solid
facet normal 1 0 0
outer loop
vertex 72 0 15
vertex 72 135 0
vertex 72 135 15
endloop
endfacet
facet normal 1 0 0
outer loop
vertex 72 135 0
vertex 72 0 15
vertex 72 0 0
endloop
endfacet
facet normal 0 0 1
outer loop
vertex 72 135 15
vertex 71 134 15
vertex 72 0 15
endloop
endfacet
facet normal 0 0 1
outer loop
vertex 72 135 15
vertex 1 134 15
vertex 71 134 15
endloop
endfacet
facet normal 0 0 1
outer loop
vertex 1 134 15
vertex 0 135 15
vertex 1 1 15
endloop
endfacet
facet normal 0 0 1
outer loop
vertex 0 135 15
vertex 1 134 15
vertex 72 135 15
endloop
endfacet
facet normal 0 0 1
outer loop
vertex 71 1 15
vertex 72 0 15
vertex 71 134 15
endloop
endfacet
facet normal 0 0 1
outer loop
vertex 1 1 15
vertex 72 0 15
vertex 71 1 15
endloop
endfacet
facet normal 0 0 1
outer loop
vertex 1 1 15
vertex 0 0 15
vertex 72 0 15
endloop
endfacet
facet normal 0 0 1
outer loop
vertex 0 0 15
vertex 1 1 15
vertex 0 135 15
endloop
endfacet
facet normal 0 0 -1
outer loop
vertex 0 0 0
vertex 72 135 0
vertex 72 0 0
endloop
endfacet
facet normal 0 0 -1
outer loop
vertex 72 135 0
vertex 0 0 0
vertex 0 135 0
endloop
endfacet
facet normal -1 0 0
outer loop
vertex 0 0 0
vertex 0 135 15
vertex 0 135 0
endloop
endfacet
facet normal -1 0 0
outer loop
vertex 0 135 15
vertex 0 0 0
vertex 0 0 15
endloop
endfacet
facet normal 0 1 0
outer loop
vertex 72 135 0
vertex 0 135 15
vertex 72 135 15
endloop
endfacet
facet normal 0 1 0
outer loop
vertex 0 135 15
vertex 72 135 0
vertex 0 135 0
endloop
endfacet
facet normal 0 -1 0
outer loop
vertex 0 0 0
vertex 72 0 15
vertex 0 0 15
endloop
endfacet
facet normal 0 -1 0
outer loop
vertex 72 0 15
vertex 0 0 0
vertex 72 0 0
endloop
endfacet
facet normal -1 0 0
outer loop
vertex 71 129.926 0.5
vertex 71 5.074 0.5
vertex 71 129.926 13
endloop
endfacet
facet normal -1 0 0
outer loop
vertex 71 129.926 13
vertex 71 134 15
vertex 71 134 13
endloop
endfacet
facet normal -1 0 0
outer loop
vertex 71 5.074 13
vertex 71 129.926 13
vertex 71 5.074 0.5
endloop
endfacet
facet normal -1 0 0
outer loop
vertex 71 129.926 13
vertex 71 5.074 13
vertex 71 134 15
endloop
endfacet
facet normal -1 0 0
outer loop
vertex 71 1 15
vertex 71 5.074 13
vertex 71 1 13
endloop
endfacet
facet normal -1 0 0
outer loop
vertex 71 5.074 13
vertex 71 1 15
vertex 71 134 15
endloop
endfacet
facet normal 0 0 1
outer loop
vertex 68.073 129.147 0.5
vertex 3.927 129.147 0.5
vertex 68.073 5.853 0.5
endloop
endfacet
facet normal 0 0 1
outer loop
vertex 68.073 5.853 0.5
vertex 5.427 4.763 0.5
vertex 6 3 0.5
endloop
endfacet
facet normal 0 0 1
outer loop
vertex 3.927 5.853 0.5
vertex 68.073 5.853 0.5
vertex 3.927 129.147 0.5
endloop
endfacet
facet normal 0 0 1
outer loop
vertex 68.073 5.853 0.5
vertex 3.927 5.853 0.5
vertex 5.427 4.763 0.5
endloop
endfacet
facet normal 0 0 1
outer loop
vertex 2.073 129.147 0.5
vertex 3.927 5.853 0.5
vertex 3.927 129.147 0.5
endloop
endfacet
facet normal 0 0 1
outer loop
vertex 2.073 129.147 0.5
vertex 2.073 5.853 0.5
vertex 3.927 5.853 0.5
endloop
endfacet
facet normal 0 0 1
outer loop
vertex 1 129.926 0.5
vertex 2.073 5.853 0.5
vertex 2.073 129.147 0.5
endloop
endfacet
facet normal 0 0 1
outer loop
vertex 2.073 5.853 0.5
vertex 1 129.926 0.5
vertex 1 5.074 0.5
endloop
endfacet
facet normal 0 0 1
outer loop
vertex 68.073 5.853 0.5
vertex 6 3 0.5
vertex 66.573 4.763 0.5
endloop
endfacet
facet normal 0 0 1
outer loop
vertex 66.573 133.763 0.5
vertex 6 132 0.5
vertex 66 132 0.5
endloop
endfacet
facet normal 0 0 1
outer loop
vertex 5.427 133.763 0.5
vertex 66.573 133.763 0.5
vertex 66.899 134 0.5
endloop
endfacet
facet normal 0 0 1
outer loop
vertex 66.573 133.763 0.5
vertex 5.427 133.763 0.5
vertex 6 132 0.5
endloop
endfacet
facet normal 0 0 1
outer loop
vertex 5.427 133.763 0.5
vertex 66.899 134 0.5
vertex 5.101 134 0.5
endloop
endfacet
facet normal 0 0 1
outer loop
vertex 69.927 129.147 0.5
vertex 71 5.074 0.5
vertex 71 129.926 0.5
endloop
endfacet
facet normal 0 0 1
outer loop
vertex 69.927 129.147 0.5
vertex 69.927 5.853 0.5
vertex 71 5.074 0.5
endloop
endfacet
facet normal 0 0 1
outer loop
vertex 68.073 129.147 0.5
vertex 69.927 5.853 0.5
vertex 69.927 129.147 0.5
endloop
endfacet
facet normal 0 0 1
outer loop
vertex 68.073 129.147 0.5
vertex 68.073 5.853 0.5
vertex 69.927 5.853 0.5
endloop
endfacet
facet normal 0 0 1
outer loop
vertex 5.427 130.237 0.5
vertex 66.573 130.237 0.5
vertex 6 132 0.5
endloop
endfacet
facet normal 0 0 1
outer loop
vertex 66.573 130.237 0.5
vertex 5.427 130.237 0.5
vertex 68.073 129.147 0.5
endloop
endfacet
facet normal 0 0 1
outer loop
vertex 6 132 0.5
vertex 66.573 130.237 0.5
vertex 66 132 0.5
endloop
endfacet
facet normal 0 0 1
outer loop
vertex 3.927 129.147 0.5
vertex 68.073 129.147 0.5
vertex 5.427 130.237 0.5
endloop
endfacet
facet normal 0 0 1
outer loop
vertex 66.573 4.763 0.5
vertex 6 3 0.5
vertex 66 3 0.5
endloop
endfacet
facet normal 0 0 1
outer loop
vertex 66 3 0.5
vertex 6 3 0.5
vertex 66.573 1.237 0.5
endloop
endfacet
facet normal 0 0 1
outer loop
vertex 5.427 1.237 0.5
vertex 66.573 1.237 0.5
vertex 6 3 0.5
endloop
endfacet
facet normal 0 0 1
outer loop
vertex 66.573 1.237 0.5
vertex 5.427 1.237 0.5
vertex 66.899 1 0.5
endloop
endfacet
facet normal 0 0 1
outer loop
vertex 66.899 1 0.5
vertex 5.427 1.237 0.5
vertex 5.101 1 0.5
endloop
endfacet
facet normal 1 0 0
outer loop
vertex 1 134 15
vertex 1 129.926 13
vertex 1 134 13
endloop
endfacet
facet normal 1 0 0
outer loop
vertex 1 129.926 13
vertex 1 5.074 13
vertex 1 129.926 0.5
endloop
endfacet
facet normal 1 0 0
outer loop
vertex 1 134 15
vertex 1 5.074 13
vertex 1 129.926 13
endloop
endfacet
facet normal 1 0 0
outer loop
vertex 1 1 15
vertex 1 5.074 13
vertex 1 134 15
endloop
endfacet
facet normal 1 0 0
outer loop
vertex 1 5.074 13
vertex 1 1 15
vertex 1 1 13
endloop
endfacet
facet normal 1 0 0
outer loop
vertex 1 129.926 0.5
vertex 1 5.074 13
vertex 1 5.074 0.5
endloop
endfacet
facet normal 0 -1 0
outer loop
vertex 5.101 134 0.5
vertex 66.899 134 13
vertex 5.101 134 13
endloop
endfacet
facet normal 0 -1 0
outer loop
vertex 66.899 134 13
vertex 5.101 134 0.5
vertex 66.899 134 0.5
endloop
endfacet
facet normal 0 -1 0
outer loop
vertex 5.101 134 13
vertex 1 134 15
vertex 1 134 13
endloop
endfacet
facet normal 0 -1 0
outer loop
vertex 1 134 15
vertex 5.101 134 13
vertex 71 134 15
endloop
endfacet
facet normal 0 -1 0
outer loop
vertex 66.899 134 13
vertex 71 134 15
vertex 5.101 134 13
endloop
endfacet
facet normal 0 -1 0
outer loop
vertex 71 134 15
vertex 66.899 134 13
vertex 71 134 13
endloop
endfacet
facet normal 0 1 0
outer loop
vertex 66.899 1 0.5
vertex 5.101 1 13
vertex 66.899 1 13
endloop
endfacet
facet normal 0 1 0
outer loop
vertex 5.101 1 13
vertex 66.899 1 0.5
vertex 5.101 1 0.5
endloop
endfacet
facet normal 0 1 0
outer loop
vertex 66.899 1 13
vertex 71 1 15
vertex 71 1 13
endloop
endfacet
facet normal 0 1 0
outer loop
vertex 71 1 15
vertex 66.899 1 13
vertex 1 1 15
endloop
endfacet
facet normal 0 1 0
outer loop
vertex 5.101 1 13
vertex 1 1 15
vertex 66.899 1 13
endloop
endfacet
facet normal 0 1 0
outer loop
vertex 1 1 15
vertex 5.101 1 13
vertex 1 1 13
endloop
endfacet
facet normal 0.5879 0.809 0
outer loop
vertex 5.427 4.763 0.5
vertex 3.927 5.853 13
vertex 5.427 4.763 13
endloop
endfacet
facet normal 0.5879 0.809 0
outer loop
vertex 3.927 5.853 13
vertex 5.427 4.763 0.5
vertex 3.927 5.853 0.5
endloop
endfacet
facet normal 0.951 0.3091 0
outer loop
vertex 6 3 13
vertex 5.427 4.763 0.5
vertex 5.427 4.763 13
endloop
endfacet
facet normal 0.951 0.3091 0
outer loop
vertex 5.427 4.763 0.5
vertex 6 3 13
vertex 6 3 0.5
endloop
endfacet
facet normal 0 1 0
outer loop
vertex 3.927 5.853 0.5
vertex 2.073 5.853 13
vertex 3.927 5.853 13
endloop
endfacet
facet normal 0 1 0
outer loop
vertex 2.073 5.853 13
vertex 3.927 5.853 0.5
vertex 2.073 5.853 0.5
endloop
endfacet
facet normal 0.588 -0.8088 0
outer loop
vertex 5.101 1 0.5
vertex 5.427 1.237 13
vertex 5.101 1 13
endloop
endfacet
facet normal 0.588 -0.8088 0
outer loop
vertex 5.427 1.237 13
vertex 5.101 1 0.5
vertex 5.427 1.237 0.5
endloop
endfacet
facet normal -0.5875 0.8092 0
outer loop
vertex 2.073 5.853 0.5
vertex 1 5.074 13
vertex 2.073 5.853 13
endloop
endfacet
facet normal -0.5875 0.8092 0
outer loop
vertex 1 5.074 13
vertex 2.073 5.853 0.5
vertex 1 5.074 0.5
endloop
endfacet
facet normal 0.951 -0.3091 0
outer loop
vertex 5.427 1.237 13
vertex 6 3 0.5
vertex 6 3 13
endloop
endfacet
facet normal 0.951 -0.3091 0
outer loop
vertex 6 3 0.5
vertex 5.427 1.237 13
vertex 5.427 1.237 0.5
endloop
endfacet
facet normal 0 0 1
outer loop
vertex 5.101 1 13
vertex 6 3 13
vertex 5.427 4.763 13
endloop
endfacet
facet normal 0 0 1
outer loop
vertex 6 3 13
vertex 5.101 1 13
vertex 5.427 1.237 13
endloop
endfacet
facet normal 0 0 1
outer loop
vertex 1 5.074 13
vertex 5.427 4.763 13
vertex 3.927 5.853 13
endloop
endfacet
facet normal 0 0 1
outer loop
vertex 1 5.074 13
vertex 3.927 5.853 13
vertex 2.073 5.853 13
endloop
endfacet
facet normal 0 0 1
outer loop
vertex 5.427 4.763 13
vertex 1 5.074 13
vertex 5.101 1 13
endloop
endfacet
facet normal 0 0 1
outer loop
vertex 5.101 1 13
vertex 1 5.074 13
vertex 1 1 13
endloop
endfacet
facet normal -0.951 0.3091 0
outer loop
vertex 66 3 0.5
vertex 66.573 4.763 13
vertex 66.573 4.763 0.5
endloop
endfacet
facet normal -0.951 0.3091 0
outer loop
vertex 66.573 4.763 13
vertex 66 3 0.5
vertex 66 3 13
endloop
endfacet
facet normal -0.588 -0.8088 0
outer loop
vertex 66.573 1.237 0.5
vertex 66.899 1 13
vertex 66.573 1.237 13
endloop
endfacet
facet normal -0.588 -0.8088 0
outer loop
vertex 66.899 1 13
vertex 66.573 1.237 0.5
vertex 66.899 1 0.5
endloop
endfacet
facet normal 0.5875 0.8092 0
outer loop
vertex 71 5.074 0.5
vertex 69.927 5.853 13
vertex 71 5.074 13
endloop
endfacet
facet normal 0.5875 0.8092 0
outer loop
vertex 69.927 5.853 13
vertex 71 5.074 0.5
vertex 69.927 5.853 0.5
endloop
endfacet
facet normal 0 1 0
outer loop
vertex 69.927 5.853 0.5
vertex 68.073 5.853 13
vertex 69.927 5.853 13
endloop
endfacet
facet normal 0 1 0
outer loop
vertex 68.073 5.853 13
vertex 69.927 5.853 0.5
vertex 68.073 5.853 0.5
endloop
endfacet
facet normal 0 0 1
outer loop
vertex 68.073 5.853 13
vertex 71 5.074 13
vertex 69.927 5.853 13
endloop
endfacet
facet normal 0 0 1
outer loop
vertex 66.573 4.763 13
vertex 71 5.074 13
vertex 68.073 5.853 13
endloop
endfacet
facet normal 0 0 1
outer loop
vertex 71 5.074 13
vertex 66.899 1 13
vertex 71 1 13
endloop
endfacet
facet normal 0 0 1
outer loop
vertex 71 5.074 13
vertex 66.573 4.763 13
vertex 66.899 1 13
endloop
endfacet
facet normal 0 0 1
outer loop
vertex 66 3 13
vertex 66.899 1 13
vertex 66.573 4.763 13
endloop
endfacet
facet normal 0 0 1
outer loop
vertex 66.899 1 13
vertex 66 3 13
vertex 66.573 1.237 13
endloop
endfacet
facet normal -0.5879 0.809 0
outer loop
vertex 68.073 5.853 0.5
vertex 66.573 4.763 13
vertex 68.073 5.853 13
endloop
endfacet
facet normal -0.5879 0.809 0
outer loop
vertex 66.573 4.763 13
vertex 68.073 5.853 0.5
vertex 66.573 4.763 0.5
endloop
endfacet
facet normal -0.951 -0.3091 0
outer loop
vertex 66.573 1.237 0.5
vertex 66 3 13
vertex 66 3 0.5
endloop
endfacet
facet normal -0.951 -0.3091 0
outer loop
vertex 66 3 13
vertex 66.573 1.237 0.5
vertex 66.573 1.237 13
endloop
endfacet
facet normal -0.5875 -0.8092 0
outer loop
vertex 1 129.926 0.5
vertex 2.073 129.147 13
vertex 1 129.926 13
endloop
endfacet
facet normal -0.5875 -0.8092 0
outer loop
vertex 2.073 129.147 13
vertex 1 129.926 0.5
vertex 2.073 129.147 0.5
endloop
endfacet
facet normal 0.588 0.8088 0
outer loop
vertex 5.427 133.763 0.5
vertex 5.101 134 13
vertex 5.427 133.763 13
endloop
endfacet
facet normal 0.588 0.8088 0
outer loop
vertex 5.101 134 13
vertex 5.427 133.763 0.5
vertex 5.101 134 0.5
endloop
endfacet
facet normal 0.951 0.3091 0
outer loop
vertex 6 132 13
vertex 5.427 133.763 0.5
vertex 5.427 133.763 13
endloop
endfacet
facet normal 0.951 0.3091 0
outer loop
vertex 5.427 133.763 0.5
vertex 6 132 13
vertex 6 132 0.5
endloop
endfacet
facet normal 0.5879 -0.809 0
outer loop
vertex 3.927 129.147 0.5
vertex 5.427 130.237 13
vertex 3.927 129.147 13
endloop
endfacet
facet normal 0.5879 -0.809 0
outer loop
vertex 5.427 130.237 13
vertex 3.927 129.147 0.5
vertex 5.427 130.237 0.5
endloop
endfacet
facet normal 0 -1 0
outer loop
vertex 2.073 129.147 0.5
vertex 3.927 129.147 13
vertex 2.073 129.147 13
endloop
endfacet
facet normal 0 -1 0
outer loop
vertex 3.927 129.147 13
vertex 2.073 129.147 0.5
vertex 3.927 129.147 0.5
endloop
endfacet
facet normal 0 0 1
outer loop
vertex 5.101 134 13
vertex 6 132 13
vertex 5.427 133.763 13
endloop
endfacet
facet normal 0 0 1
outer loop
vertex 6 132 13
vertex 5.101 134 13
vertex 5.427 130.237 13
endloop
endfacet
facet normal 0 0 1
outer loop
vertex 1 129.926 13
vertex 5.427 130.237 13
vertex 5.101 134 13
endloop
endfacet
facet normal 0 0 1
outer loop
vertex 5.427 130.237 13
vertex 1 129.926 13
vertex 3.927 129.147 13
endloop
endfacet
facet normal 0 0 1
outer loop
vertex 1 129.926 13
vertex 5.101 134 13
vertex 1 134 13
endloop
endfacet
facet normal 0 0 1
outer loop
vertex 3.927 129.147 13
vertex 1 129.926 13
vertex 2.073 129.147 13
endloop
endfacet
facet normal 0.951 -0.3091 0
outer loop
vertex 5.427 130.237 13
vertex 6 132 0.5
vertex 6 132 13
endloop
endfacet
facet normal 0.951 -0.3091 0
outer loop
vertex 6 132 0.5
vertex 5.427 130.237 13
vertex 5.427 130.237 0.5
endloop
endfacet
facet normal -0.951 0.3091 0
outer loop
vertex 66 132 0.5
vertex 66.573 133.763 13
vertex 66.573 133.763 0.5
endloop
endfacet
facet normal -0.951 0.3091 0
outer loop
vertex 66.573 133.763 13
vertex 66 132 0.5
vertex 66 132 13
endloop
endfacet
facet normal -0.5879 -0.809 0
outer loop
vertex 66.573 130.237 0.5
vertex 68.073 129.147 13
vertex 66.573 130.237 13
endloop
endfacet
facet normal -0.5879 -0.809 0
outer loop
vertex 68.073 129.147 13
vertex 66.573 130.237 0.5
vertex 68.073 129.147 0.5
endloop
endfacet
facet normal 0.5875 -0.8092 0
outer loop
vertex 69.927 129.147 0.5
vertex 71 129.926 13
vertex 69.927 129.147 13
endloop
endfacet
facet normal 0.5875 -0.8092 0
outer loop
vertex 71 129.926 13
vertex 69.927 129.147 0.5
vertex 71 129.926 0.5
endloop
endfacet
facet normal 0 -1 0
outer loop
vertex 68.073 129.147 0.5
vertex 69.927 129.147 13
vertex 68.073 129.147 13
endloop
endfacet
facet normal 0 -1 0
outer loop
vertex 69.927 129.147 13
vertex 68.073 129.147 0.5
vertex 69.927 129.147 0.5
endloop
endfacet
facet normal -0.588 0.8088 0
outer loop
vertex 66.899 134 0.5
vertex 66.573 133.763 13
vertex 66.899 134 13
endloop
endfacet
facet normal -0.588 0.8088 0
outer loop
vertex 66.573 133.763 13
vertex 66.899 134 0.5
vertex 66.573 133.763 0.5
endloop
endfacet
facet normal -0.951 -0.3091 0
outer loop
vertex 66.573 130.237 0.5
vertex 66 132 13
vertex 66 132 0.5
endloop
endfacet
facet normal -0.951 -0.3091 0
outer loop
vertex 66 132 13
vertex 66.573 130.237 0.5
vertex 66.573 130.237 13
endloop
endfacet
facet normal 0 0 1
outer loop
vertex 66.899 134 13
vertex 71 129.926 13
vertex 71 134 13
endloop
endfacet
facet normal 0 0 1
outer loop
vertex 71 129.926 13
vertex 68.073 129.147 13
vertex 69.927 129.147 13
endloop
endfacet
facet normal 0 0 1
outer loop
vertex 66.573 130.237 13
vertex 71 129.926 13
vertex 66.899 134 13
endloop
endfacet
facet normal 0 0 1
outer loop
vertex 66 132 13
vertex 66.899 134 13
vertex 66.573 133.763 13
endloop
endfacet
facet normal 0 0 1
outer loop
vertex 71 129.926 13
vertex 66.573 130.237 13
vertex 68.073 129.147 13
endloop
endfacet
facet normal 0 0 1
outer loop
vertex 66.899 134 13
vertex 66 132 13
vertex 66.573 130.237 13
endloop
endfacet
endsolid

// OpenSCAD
// x,y,z dimensions
// t thickness of frame
// d screw dome diameter
// dh screw dome height
module case_outline(x,y,z,t,d,dh) {
    union () {
        difference() {
            cube ([x, y, z], center=false);
            translate([t,t,(t/2)]) {
                cube ([x-2*t, y-2*t, z], center=false);
            };
        }
        translate([d,d,0]) {
            cylinder (h=dh,r=d,center=false);
        }
        translate([x-d,d,0]) {
            cylinder (h=dh,r=d,center=false);
        }
        translate([d,y-d,0]) {
            cylinder (h=dh,r=d,center=false);
        }
        translate([x-d,y-d,0]) {
            cylinder (h=dh,r=d,center=false);
        }
    }
}

case_outline(72,135,15,1,3,13);
